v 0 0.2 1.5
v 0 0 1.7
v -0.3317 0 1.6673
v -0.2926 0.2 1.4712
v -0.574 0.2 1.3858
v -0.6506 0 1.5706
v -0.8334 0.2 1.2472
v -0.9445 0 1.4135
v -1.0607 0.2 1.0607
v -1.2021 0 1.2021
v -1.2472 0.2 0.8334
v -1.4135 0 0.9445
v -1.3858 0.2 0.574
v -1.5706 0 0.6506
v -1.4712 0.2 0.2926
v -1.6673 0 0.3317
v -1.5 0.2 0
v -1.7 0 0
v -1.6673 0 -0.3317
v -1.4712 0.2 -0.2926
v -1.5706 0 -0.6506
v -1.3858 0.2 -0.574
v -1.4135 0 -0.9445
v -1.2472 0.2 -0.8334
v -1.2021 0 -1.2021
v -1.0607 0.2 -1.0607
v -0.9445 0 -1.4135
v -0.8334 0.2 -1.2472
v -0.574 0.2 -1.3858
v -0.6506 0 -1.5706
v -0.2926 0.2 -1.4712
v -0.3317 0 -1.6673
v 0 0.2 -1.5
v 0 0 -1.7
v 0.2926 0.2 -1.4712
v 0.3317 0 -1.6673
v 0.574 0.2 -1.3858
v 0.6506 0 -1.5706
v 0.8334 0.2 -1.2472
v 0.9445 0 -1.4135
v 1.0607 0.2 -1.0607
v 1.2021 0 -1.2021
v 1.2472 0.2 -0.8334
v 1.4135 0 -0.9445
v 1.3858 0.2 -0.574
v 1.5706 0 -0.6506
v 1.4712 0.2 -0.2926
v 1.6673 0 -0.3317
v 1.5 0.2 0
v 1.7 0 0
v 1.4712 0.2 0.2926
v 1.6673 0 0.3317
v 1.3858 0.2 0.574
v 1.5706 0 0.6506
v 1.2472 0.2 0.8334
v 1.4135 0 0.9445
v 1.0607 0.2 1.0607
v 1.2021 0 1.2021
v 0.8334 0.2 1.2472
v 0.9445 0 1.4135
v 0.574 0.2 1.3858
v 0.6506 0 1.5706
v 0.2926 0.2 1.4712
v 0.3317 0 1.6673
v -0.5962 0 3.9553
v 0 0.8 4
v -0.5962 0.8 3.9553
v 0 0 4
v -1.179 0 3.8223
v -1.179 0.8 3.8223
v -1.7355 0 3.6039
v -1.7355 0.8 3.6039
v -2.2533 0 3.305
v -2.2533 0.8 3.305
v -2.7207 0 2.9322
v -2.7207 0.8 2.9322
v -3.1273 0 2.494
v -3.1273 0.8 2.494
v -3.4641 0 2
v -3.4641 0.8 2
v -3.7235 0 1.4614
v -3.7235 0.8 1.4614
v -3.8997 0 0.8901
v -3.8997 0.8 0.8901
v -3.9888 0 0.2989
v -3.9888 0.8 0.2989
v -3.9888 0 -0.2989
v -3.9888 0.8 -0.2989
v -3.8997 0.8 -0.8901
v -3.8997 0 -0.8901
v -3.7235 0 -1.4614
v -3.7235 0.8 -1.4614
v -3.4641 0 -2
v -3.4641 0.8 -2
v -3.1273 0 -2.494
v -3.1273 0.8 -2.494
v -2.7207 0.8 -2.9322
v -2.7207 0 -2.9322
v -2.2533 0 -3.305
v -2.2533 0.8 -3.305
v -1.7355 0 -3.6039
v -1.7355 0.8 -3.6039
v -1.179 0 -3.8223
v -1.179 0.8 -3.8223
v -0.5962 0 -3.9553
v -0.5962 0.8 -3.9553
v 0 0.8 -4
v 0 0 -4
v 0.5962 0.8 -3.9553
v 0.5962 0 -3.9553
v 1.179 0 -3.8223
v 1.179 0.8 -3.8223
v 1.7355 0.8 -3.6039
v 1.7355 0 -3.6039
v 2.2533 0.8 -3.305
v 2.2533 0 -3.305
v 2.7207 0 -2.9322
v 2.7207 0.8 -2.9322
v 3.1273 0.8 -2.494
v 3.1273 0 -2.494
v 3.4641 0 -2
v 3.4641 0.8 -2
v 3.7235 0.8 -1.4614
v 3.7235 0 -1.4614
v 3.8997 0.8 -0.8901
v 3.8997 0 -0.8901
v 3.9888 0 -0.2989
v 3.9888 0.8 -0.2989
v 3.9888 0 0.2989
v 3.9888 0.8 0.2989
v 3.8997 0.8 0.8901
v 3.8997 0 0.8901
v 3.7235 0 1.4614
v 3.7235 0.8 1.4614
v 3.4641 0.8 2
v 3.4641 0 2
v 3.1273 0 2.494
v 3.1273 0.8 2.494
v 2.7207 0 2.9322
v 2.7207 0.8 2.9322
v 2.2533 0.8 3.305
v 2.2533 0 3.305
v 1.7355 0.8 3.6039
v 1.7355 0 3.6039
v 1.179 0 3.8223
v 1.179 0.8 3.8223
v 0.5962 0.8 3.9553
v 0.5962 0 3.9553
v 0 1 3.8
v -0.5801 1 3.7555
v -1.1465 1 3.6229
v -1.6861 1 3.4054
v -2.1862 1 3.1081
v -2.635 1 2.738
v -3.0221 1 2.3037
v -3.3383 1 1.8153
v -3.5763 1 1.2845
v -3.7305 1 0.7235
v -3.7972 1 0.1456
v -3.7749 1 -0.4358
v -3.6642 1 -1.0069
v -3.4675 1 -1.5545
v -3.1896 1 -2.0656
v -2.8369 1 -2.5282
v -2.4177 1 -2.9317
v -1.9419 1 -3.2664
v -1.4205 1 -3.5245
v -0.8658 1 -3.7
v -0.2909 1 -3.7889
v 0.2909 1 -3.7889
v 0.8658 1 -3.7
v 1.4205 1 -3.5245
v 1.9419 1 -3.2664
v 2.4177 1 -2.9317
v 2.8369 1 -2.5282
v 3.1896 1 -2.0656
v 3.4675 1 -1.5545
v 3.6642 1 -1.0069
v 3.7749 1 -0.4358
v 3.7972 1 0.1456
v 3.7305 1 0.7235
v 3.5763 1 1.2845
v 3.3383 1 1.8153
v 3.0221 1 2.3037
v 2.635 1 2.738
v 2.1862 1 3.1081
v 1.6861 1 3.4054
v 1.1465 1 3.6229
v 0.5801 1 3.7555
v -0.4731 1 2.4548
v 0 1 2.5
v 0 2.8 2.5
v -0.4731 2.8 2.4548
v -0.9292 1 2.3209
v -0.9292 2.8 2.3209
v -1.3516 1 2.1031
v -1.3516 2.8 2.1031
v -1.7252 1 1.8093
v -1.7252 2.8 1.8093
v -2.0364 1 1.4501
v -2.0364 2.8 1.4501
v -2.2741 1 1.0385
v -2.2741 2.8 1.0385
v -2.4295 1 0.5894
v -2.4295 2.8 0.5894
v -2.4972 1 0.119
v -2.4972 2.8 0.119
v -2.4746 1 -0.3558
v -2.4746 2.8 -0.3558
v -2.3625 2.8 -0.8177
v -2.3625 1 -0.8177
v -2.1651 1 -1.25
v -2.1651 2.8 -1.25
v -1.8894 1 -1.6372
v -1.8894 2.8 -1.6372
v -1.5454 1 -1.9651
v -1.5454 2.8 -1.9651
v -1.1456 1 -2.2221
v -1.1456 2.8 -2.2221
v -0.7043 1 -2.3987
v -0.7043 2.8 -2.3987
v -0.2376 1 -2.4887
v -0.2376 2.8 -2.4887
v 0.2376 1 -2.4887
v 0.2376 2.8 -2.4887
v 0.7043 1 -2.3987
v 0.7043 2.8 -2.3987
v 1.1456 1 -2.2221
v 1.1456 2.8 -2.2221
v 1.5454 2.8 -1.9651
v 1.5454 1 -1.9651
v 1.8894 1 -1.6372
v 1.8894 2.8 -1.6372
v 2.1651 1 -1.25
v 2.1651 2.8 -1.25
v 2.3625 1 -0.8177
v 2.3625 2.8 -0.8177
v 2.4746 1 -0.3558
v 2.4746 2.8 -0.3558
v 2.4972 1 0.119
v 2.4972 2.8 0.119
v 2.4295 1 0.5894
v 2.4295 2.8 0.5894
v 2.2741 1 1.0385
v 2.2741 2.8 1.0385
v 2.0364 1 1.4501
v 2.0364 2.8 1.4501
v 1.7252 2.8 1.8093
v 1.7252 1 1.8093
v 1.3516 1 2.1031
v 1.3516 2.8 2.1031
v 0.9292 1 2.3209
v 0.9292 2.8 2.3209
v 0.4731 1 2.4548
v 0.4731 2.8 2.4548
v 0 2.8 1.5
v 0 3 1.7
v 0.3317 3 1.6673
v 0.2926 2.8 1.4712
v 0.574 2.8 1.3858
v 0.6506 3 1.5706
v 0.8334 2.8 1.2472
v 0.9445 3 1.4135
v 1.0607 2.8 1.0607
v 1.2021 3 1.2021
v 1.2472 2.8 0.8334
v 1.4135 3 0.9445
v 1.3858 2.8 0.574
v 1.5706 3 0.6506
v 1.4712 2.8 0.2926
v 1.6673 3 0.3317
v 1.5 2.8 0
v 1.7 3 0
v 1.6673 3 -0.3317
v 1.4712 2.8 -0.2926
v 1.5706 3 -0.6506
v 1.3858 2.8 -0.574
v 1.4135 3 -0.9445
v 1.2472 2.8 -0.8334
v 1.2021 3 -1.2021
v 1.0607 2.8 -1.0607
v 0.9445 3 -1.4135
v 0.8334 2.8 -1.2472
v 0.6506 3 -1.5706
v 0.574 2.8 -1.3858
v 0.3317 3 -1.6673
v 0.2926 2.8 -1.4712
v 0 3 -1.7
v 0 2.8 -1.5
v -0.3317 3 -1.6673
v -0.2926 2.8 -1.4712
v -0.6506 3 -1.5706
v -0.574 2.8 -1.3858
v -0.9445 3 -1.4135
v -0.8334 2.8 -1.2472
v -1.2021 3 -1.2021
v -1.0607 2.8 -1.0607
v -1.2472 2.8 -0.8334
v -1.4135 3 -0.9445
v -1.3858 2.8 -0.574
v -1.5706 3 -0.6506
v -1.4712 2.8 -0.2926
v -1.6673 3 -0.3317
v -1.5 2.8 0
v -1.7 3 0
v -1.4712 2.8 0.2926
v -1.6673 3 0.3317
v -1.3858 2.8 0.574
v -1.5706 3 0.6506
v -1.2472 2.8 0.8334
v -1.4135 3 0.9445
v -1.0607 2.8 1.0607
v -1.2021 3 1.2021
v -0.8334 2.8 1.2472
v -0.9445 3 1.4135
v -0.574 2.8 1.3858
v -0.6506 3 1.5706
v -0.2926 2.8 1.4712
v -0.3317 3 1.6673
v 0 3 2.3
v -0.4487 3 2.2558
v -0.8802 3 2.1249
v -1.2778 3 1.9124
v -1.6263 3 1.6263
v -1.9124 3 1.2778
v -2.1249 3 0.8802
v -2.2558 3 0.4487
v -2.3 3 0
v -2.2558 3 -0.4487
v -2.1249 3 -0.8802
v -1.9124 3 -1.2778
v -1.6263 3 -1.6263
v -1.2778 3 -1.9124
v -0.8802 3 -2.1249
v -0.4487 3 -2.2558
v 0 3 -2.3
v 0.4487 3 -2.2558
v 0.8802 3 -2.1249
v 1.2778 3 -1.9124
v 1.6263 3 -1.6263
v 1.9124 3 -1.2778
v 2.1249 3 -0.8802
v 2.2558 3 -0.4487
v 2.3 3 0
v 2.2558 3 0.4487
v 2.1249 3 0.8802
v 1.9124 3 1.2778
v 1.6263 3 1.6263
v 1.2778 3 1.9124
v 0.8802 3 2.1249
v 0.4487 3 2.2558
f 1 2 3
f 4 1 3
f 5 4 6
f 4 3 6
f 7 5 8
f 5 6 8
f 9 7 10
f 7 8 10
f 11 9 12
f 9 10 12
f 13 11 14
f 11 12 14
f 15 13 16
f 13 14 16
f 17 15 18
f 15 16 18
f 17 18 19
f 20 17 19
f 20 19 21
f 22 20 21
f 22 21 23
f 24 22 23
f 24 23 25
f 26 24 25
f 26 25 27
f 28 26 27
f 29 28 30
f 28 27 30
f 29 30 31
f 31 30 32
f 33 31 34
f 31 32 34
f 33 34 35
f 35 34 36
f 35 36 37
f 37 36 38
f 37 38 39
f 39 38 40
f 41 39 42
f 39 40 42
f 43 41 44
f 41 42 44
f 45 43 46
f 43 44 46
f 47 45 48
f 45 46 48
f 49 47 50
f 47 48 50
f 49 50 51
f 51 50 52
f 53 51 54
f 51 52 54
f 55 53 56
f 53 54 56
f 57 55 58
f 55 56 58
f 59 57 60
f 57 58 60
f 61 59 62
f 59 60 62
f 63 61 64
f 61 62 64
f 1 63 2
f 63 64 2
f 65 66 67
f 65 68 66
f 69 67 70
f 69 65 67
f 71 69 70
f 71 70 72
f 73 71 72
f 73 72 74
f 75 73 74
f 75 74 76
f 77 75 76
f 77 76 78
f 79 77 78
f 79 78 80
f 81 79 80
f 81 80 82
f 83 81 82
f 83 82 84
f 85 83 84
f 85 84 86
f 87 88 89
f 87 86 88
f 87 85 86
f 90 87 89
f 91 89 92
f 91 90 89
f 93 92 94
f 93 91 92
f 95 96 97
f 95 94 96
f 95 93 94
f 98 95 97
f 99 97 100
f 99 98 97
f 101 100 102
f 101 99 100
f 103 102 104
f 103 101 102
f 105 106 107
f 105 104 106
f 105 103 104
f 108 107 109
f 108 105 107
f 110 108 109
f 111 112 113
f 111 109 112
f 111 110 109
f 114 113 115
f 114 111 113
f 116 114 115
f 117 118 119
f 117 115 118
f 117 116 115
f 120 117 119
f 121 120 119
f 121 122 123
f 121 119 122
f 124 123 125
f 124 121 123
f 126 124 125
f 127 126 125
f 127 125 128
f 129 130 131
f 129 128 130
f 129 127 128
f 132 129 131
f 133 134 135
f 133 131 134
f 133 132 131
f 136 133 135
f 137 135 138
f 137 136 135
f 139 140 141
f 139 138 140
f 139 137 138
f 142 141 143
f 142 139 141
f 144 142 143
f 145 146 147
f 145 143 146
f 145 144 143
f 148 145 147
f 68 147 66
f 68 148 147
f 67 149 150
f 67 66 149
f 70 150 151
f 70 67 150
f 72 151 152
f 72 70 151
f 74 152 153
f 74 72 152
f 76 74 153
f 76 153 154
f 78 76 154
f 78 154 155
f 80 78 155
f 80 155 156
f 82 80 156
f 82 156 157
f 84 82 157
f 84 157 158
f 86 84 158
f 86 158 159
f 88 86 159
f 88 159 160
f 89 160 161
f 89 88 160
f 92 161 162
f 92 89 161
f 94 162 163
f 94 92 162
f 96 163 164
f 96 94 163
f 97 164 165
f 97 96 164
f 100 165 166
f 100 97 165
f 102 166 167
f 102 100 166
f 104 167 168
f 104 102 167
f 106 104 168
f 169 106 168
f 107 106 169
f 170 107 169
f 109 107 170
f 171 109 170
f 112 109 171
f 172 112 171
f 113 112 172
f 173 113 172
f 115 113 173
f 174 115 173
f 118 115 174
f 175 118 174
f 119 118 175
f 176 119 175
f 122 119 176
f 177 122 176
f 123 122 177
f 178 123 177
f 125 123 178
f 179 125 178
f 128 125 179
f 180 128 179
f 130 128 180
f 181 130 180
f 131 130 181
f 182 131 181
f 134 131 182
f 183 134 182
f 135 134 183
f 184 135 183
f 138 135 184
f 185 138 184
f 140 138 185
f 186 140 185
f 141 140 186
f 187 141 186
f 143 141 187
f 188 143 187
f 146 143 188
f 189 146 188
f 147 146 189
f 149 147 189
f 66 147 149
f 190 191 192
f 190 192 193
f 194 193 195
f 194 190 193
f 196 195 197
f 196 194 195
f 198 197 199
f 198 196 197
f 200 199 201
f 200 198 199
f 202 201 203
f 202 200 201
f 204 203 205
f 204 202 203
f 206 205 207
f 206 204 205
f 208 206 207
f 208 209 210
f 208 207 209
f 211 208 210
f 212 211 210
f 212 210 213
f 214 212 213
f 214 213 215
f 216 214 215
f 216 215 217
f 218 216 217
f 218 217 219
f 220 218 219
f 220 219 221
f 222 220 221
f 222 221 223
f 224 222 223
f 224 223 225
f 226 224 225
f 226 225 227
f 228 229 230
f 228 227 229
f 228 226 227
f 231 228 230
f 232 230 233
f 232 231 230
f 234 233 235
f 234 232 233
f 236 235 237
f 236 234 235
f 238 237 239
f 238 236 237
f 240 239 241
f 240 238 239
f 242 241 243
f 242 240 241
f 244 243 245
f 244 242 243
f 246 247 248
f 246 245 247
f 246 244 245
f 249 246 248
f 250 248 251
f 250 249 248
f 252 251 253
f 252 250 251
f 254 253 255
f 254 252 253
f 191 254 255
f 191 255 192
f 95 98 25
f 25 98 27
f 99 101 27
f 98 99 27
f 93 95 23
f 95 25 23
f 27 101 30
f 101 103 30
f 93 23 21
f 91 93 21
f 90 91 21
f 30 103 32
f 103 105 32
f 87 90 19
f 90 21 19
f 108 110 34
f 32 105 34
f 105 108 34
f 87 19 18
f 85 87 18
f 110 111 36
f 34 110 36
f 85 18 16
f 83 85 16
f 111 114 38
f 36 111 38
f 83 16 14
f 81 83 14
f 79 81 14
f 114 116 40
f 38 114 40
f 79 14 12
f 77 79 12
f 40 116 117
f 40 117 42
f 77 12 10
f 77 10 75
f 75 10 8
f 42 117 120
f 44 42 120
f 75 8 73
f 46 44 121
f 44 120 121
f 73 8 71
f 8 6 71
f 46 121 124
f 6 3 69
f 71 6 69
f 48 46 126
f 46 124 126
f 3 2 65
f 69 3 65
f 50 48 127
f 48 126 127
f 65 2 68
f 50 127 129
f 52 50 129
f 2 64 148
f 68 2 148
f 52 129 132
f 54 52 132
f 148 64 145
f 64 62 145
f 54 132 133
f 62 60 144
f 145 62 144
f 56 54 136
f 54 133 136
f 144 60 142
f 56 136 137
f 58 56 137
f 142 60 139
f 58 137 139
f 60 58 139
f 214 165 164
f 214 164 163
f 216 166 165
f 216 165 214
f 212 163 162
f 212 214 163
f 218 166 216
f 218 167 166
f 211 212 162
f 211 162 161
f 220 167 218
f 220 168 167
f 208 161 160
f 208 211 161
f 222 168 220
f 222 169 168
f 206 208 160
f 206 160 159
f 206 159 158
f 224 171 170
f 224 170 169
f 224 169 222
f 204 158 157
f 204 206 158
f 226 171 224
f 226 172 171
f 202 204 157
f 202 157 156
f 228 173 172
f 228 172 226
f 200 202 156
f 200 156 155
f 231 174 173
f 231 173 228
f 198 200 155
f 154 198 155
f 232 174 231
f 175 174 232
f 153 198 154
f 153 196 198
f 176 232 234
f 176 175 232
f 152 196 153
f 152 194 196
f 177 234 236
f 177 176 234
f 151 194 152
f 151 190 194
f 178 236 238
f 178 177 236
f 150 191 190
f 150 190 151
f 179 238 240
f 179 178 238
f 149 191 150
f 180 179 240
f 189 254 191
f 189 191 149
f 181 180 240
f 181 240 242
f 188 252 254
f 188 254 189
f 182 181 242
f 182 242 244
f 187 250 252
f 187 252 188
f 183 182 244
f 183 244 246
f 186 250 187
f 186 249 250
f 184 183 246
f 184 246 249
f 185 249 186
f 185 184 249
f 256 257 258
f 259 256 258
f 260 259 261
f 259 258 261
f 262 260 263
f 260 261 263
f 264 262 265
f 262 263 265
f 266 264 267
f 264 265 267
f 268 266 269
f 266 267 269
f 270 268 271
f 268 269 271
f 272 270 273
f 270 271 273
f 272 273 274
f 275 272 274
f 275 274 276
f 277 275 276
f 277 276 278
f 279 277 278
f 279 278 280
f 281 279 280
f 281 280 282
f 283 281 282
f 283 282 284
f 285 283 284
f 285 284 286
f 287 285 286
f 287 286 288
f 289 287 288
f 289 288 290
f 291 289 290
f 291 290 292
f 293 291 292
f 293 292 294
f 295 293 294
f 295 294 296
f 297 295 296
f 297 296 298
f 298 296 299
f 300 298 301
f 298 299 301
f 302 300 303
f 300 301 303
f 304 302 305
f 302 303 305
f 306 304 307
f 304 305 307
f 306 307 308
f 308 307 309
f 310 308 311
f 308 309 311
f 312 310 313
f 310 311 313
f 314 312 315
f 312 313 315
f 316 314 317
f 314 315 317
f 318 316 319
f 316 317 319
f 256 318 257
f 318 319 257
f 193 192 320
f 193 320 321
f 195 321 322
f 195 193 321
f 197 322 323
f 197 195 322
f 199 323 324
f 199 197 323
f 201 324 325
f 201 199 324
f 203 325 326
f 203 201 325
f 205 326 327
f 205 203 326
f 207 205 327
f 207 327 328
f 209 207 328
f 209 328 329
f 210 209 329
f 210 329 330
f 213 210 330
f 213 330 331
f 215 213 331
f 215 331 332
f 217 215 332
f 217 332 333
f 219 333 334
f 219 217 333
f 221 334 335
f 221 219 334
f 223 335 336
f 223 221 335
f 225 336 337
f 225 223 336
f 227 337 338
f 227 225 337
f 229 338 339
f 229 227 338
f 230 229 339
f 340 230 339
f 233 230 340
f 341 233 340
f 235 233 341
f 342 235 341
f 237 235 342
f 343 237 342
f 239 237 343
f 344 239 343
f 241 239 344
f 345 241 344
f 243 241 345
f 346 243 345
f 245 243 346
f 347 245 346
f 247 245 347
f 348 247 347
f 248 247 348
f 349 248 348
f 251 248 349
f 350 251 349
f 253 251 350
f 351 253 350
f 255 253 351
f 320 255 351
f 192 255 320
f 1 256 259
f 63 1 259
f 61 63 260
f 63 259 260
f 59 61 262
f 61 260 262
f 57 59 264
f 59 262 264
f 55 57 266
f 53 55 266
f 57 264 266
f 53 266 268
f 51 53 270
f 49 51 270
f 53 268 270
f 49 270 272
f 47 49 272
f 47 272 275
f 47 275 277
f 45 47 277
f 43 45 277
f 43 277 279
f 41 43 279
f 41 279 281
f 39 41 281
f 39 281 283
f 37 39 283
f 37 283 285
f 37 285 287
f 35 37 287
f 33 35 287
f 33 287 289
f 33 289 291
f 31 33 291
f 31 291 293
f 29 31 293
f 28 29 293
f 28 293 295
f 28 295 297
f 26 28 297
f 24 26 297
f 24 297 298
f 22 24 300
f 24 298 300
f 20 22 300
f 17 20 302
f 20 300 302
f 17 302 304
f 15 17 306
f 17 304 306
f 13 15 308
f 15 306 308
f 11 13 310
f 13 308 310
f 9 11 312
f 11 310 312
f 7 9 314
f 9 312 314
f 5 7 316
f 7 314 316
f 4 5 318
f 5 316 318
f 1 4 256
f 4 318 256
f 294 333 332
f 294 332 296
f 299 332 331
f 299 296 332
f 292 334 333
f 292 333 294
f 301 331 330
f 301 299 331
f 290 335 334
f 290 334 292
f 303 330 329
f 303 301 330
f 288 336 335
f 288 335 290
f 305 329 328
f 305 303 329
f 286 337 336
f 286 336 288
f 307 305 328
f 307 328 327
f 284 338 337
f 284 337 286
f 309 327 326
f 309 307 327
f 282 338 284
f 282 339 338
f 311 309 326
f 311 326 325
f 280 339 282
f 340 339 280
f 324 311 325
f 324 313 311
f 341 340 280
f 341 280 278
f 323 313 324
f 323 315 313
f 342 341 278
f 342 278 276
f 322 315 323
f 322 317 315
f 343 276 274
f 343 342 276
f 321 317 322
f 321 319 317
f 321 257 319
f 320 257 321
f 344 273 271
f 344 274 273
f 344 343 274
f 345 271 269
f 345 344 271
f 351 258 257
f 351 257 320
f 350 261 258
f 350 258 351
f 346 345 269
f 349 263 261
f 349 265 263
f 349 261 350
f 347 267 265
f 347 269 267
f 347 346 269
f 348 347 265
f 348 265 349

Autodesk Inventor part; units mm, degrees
ref_plane "YZ Plane" through (0, 0, 0) normal (1, 0, 0) x (0, 1, 0)
ref_plane "XZ Plane" through (0, 0, 0) normal (0, 1, 0) x (-1, 0, 0)
ref_plane "XY Plane" through (0, 0, 0) normal (0, 0, 1) x (1, 0, 0)
sketch "Skizze3" plane through (0, 0, 0) normal (1, 0, 0) x (0, 1, 0)
  line L0 (0, 0) -> (4.4378, 0)
  line L1 (0, 1.5) -> (3, 1.5)
  line L2 (3, 1.5) -> (3, 2.5)
  line L3 (3, 2.5) -> (1, 2.5)
  line L4 (1, 2.5) -> (1, 4)
  line L5 (1, 4) -> (0, 4)
  line L6 (0, 4) -> (0, 1.5)
  dimension "d4" = 1
  dimension "d5" = 3
  dimension "d6" = 3
  dimension "d7" = 8
  dimension "d8" = 5
revolve "Umdrehung1" add sketch "Skizze3" angle 360 about axis through (0, 0, 0) along (0, 1, 0)
chamfer "Fase1" distance 0.2 angle 45 4 edges at (0, 3, -2.5) (0, 3, -1.5) (0, 1, -4) (0, 0, -1.5)
properties part number "BT014_huenin20_23" material "Messing"
